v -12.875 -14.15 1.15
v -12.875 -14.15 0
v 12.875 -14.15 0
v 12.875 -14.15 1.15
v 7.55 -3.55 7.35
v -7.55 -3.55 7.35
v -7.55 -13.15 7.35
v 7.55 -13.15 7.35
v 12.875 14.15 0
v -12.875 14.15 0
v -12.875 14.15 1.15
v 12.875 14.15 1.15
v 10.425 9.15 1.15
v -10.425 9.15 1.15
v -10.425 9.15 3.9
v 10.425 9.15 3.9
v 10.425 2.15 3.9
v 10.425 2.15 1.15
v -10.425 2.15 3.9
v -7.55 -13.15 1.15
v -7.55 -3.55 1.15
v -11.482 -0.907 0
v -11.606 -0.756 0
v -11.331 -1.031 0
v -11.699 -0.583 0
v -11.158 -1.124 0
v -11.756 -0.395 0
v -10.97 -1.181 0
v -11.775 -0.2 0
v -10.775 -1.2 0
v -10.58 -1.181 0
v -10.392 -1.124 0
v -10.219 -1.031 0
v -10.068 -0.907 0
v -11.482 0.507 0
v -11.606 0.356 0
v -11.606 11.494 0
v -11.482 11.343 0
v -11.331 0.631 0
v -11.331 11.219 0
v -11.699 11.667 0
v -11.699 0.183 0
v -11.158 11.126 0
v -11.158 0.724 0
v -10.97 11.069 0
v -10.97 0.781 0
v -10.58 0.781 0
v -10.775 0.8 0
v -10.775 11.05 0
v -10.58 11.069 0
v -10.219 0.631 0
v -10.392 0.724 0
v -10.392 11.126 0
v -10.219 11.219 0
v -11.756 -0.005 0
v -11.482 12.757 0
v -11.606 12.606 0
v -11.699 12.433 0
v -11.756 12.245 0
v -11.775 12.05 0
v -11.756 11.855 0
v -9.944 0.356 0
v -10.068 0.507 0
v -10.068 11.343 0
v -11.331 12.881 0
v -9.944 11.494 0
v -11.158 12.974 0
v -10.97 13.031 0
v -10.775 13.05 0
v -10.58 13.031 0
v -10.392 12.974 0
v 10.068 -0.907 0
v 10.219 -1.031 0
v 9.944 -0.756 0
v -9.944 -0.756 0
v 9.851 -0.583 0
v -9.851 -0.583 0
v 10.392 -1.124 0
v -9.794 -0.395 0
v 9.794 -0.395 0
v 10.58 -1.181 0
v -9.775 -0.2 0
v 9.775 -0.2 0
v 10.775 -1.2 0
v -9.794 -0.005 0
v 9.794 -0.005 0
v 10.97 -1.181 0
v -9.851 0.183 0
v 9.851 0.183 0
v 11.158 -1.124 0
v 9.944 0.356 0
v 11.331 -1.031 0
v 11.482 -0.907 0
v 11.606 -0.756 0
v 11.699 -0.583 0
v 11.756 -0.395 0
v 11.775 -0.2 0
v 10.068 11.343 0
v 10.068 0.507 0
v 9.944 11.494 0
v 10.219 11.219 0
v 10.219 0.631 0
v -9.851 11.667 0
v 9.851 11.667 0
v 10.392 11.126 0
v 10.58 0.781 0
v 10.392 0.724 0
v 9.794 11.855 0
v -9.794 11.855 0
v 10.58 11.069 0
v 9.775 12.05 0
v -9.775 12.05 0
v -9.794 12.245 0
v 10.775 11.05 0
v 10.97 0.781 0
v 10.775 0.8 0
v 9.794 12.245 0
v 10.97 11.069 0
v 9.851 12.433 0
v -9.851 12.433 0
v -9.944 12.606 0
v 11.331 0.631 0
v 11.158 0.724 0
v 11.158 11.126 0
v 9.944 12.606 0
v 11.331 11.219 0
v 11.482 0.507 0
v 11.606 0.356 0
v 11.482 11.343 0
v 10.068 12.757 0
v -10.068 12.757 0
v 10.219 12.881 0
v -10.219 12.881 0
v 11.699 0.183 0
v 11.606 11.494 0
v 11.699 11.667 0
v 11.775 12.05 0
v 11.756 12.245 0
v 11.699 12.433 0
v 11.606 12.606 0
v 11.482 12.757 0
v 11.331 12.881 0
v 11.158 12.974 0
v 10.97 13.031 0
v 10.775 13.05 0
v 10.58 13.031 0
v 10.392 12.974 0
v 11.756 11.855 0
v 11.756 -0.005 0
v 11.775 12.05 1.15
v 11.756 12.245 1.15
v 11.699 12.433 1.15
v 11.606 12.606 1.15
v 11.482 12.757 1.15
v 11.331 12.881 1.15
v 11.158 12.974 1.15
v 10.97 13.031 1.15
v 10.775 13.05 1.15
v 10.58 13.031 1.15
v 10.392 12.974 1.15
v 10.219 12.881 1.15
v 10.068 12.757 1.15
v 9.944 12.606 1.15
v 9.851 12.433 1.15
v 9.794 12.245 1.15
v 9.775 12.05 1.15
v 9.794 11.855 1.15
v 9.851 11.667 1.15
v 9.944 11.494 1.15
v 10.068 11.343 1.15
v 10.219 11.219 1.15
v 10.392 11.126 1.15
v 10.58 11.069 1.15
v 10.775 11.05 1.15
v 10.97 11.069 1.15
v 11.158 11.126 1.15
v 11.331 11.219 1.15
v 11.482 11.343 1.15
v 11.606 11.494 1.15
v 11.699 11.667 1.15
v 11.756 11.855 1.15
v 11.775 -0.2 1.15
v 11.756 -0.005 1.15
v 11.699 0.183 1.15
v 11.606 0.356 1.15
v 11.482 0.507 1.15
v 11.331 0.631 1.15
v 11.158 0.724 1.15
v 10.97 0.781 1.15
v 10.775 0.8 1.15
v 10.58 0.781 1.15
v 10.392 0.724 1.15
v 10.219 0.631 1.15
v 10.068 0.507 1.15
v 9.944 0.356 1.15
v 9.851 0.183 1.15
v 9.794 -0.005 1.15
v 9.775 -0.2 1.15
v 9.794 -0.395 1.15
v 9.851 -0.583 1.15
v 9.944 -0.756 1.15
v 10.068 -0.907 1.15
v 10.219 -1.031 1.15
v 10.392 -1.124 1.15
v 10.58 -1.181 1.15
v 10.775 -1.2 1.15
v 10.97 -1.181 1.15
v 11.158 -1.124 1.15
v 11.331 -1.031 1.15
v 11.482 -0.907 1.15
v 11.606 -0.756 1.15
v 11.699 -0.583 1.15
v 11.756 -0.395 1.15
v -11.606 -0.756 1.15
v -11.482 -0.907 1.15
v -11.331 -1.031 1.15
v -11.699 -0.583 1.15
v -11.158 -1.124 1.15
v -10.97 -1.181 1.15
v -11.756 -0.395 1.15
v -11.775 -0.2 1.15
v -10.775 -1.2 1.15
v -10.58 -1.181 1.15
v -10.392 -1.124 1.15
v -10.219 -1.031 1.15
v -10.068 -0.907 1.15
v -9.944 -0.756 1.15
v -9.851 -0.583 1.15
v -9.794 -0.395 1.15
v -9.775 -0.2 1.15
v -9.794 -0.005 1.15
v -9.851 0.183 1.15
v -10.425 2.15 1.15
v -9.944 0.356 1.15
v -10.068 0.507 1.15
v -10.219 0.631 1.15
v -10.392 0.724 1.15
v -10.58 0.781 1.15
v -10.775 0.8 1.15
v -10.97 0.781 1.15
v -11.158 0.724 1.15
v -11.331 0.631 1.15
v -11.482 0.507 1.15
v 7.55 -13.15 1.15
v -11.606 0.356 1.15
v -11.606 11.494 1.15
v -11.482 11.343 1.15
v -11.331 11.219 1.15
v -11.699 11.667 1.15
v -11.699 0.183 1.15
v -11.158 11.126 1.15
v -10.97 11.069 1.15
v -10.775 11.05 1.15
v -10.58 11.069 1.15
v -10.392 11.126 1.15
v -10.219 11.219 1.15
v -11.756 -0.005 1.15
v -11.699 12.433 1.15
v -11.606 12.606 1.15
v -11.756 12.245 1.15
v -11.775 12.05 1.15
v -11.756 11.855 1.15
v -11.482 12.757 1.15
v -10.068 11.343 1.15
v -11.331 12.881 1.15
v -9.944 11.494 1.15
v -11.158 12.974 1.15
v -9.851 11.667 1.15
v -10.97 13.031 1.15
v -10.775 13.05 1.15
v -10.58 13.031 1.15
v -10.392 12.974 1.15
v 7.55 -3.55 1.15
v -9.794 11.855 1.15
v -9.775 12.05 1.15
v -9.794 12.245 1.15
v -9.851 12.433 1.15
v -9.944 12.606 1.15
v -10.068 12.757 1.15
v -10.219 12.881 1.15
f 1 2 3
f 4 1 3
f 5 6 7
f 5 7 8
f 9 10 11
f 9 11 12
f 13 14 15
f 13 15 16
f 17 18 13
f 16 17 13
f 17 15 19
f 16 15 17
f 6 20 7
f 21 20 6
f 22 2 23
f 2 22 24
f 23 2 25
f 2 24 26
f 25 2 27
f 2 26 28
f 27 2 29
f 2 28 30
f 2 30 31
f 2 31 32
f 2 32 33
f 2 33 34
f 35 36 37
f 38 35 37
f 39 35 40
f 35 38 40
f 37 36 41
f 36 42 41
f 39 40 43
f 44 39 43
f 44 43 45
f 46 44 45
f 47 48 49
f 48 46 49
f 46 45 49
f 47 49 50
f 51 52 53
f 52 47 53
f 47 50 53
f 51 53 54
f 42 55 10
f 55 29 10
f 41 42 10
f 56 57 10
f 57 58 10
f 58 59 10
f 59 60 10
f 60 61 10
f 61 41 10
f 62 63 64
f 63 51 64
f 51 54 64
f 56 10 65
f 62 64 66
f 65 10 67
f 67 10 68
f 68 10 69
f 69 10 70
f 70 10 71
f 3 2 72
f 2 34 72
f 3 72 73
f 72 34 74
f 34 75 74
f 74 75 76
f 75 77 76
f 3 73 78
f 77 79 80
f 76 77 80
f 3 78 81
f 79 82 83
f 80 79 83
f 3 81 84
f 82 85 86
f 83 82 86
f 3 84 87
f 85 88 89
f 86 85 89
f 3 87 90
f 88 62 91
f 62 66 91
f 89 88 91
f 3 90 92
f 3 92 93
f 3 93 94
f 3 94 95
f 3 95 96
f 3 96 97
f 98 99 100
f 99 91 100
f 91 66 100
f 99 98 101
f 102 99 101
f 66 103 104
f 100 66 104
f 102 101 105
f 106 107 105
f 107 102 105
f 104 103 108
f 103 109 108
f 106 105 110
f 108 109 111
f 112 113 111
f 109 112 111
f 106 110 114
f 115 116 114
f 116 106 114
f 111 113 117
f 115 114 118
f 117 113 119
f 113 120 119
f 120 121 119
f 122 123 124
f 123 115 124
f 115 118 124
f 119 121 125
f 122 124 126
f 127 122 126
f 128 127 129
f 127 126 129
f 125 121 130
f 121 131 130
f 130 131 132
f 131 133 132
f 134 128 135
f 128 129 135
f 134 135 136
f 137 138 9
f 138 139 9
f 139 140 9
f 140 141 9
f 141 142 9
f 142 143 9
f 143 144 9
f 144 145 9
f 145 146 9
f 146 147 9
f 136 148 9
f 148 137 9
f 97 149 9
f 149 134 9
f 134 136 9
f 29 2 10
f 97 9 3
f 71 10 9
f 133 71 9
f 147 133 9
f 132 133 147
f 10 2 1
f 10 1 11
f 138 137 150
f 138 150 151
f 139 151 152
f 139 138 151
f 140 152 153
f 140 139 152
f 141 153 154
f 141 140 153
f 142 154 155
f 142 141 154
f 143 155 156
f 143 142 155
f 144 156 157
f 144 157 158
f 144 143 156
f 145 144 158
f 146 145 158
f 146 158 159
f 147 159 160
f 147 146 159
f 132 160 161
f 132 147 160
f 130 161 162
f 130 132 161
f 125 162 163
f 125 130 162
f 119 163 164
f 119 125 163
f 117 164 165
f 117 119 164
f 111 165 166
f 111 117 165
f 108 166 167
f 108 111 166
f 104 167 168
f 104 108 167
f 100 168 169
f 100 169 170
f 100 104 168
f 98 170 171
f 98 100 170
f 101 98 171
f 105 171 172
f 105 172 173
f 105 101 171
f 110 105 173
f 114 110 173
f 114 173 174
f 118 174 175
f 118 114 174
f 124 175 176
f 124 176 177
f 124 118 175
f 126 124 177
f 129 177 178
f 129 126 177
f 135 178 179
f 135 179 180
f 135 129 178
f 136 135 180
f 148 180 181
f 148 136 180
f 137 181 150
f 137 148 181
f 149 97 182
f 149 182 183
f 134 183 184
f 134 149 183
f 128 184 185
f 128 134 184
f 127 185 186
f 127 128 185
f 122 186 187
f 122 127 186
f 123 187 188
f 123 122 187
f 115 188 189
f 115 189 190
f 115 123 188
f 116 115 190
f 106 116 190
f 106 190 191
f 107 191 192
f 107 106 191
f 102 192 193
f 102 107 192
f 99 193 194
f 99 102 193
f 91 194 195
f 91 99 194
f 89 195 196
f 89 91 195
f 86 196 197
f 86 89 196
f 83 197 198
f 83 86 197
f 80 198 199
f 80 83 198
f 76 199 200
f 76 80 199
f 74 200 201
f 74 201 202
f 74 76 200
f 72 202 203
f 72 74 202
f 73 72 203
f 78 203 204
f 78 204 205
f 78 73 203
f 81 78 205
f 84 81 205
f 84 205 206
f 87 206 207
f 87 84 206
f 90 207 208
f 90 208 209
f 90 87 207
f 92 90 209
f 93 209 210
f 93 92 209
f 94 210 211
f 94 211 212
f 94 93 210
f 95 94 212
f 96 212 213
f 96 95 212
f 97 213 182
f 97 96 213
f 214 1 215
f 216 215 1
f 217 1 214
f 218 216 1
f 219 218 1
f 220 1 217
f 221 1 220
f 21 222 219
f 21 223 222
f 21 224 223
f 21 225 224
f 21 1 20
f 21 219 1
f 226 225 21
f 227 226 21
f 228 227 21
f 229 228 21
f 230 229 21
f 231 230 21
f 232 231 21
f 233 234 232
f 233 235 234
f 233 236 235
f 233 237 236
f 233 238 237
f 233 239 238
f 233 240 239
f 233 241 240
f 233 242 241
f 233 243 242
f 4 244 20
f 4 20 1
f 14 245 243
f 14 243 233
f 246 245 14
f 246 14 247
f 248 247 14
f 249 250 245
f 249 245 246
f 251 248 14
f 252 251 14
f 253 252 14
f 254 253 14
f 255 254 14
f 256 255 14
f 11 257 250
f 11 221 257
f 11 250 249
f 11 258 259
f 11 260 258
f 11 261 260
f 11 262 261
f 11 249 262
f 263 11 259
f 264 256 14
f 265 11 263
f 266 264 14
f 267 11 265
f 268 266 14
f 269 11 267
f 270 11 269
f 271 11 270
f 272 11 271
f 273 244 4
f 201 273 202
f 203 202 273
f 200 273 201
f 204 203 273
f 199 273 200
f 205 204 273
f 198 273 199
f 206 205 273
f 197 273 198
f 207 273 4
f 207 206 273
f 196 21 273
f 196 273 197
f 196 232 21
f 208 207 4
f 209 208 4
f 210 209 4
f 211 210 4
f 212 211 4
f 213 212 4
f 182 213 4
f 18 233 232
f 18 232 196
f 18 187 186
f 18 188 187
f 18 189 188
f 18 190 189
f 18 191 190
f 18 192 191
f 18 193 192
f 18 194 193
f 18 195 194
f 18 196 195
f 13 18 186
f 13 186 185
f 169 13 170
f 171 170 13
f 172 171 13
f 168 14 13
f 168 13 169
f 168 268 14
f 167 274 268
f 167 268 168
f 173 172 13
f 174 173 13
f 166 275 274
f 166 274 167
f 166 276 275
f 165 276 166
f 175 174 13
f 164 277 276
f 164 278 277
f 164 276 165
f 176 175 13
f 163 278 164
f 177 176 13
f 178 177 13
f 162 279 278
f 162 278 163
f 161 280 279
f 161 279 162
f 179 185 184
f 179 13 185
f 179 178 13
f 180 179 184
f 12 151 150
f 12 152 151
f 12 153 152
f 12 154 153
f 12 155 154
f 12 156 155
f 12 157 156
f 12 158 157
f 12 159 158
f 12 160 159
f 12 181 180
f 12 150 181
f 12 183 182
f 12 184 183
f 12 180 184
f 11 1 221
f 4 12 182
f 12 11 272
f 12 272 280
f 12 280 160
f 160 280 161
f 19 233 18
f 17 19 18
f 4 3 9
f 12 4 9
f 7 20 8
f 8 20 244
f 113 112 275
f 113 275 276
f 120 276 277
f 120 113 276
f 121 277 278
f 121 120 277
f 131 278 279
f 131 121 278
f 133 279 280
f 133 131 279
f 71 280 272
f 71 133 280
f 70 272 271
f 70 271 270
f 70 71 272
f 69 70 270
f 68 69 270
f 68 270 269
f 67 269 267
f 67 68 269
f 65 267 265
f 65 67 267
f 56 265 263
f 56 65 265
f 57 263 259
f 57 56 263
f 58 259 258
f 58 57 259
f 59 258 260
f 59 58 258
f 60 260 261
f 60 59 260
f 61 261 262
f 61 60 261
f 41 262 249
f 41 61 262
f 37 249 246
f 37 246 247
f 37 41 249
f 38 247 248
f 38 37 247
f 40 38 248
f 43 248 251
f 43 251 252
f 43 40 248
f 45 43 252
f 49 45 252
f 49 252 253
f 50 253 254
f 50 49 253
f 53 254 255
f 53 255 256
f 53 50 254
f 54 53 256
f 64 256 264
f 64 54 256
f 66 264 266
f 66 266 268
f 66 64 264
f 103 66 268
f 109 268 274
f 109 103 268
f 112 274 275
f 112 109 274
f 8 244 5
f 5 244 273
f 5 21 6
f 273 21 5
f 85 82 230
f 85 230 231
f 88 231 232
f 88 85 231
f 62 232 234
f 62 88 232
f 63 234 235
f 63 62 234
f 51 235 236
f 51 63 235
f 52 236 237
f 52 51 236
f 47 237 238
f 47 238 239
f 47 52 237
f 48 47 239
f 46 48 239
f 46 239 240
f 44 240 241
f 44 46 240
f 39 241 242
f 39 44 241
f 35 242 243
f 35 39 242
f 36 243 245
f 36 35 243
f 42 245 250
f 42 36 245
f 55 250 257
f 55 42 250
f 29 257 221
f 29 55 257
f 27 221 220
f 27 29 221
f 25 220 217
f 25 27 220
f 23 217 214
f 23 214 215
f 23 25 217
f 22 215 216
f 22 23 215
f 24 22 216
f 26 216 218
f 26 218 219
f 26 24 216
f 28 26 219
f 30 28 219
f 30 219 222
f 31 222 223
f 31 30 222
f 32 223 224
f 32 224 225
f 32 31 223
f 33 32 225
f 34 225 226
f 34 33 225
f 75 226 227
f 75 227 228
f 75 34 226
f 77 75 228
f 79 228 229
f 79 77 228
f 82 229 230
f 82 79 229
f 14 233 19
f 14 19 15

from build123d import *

# Parameters (mm, degrees)
F0_W     = 25.75
F0_H     = 28.3
F0_W_2   = 15.1
F0_H_2   = 9.6
F0_R     = 1
F0_W_3   = 20.85
F0_H_3   = 7
F1_DEPTH = 1.15
F2_DEPTH = 3.9
F3_DEPTH = 7.35


with BuildPart() as f1:
    # F0 (on Top) → F1 (new body)
    with BuildSketch(Plane.XY):
        Rectangle(F0_W, F0_H)
        with Locations((0, -8.35)):
            Rectangle(F0_W_2, F0_H_2, mode=Mode.SUBTRACT)
        with Locations((-10.775, -0.2)):
            Circle(F0_R, mode=Mode.SUBTRACT)
        with Locations((10.775, -0.2)):
            Circle(F0_R, mode=Mode.SUBTRACT)
        with Locations((0, 5.65)):
            Rectangle(F0_W_3, F0_H_3, mode=Mode.SUBTRACT)
        with Locations((-10.775, 12.05)):
            Circle(F0_R, mode=Mode.SUBTRACT)
        with Locations((10.775, 12.05)):
            Circle(F0_R, mode=Mode.SUBTRACT)
    extrude(amount=F1_DEPTH)

    # F0 (on Top) → F2 (join)
    with BuildSketch(Plane.XY):
        with Locations((0, 5.65)):
            Rectangle(F0_W_3, F0_H_3)
    extrude(amount=F2_DEPTH)

    # F0 (on Top) → F3 (join)
    with BuildSketch(Plane.XY):
        with Locations((0, -8.35)):
            Rectangle(F0_W_2, F0_H_2)
    extrude(amount=F3_DEPTH)


solid = f1.part
